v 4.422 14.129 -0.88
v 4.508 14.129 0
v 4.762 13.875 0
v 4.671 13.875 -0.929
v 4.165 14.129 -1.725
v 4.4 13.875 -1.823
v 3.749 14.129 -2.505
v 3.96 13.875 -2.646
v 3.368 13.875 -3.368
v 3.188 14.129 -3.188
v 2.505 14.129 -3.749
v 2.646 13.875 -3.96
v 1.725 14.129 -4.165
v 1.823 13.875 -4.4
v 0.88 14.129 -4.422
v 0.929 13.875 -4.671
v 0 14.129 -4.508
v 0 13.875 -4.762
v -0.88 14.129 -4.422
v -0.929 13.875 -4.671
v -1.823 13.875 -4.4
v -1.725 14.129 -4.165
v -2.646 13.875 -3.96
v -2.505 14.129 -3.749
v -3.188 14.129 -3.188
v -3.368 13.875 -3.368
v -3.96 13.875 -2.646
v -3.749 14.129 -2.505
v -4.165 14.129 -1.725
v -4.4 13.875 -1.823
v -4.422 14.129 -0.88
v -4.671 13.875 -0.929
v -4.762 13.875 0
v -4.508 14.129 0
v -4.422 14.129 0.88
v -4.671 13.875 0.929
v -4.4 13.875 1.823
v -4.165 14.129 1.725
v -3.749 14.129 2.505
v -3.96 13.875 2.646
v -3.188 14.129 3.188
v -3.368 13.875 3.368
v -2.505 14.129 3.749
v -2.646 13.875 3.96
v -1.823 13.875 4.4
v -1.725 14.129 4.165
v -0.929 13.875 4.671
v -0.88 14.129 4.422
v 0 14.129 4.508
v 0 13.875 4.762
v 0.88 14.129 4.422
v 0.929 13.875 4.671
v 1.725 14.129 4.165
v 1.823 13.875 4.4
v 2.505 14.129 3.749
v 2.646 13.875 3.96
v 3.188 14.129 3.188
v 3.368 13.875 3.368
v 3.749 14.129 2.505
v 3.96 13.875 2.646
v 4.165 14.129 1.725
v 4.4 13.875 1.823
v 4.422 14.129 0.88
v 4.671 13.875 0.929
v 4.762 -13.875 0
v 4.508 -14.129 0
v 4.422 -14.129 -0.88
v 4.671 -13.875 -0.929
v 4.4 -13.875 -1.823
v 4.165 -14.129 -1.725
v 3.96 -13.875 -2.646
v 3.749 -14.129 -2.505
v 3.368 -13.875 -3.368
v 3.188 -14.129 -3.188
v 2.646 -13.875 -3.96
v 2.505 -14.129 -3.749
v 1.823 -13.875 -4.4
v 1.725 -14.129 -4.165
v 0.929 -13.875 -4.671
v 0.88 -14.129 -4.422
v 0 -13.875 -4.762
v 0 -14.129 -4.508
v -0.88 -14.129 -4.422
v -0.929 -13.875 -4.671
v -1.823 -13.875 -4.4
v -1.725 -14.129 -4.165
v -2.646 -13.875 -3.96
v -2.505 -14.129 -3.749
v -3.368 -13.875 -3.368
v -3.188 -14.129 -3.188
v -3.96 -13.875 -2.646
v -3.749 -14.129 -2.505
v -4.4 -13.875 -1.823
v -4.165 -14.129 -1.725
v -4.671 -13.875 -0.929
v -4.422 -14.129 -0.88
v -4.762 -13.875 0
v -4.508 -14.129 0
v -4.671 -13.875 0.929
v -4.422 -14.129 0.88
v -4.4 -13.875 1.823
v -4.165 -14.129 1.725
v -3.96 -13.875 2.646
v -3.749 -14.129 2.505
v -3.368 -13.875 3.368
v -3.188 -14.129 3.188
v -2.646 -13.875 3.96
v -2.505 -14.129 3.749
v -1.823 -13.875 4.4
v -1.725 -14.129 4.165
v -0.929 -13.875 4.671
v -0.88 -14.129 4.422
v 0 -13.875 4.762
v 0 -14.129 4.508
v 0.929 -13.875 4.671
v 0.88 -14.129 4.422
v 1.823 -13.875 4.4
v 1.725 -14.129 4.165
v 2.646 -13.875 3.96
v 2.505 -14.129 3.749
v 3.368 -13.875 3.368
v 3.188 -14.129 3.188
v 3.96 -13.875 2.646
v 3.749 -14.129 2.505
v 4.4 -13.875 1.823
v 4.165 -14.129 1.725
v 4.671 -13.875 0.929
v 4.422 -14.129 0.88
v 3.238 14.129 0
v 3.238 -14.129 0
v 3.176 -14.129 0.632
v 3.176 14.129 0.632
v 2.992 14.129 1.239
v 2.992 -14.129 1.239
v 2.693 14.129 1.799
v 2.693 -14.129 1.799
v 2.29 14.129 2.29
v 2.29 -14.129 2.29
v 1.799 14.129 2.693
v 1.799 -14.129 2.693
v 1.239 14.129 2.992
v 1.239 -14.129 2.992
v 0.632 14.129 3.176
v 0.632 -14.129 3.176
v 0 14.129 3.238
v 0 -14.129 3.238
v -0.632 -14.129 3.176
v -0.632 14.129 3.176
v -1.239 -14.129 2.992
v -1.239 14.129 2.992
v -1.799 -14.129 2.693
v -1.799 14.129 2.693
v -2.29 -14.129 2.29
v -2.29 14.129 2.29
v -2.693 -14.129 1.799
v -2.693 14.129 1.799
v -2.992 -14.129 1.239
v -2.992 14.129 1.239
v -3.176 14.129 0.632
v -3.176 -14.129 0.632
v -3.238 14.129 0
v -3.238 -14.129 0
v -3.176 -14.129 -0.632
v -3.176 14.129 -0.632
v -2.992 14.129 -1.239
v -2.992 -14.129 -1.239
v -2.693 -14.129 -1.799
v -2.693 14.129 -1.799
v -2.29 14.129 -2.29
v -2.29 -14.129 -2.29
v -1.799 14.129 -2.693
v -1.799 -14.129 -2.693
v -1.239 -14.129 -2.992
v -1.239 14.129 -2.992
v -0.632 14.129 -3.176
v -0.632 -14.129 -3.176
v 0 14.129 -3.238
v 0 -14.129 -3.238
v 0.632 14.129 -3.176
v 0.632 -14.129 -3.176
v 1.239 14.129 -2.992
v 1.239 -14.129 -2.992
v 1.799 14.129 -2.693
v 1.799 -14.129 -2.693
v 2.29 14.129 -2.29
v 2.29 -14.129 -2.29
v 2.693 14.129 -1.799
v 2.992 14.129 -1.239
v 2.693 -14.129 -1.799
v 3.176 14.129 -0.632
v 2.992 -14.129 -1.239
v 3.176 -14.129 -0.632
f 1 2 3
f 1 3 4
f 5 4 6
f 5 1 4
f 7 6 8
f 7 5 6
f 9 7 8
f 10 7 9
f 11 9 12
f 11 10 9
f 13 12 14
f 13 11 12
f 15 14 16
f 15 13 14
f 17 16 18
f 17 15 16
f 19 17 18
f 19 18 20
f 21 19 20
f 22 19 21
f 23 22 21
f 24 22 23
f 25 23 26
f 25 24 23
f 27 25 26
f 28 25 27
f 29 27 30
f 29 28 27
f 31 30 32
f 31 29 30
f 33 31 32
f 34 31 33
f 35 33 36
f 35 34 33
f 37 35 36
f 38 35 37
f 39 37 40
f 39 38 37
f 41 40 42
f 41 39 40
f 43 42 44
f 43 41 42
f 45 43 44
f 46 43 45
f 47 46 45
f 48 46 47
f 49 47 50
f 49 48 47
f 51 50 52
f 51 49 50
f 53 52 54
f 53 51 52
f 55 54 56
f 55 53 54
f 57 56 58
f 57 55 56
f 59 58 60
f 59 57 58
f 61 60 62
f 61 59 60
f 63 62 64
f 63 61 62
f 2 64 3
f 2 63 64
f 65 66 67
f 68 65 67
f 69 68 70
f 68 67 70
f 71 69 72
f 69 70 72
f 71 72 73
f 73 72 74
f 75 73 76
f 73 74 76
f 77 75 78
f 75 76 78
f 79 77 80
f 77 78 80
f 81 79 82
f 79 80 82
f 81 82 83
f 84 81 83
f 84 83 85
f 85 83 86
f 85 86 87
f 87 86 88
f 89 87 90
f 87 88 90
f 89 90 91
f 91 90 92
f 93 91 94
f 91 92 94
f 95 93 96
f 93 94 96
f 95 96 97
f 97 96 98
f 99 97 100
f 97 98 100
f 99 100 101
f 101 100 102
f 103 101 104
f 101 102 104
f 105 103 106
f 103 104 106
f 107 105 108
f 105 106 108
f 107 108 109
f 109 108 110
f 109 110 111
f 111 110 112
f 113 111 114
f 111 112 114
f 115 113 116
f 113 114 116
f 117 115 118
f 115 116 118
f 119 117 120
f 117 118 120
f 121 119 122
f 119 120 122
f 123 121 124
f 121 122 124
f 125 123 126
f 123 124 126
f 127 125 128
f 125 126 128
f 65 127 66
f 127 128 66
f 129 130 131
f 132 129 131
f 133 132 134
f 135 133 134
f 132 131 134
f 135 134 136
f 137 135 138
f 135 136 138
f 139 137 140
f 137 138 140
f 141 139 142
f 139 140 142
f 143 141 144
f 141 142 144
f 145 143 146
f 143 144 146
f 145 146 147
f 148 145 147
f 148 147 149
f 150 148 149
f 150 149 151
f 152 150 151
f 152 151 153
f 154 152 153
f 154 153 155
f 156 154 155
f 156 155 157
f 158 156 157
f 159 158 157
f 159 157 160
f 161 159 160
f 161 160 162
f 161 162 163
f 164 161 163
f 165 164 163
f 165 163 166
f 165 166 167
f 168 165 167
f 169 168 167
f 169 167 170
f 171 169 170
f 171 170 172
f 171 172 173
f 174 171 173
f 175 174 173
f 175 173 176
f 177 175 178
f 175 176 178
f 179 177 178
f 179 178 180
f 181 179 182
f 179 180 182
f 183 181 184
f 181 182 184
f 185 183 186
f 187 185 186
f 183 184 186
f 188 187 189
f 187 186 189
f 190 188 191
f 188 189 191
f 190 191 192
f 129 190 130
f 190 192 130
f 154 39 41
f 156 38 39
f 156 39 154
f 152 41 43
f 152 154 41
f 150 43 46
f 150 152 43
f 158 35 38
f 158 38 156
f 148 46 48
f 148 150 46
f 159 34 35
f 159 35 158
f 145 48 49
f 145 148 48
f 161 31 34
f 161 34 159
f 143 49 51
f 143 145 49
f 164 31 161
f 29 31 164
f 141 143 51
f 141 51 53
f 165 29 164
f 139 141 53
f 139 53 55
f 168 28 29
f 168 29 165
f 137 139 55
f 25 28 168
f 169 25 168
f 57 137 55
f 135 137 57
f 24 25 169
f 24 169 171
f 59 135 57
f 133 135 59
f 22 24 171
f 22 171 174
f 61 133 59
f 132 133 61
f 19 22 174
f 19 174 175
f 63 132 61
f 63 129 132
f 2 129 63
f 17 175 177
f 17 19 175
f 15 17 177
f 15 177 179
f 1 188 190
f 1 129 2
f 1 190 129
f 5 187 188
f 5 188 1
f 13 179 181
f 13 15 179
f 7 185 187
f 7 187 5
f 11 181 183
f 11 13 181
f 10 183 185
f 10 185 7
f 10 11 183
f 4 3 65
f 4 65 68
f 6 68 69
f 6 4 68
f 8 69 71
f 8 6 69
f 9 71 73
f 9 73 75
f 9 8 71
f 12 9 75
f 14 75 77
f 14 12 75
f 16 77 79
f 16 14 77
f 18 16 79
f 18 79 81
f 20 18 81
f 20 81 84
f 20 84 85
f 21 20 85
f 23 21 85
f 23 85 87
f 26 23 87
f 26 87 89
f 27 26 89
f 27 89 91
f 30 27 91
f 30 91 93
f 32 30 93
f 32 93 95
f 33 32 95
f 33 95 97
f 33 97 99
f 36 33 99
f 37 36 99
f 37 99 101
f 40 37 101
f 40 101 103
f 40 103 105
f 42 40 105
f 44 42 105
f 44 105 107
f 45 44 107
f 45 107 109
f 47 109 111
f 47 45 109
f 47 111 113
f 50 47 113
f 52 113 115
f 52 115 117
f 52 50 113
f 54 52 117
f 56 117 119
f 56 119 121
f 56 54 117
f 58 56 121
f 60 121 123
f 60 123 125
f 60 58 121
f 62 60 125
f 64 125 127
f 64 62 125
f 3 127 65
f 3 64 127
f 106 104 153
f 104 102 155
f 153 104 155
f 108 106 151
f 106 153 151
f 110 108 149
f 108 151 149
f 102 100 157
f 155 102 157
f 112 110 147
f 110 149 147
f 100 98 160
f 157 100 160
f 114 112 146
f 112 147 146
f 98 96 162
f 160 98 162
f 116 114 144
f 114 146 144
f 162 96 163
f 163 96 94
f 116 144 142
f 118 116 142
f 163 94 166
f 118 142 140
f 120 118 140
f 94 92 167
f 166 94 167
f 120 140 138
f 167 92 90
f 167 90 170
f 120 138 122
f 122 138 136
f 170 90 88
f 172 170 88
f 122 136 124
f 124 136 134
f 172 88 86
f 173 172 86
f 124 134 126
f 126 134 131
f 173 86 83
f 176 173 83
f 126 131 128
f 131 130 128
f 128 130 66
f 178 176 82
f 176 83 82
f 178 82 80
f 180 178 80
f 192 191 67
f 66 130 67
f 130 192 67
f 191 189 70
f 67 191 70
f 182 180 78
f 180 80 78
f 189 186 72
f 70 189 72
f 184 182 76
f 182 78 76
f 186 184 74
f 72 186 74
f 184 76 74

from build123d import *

# Parameters (mm, degrees)
SKETCH1_R           = 4.7625
BOSS_EXTRUDE1_DEPTH = 14.12875
CHAMFER1_SIZE       = 0.254
SKETCH2_R           = 3.2385
CUT_EXTRUDE1_DEPTH  = 29.2575


with BuildPart() as part:
    # Sketch1 → Boss-Extrude1 (new body, symmetric)
    with BuildSketch(Plane(origin=(0, 0, 0), x_dir=(1, 0, 0), z_dir=(0, 1, 0))):
        Circle(SKETCH1_R)
    extrude(amount=BOSS_EXTRUDE1_DEPTH, both=True)

    # Chamfer1
    chamfer1_edges = [part.edges().sort_by_distance(p)[0] for p in [
        (-4.7625, -14.12875, 0),
        (-4.7625, 14.12875, 0),
    ]]
    chamfer(chamfer1_edges, length=CHAMFER1_SIZE)

    # Sketch2 → Cut-Extrude1 (cut, through all)
    with BuildSketch(Plane.XZ.offset(14.12875)):
        Circle(SKETCH2_R)
    extrude(amount=-CUT_EXTRUDE1_DEPTH, mode=Mode.SUBTRACT)


solid = part.part
